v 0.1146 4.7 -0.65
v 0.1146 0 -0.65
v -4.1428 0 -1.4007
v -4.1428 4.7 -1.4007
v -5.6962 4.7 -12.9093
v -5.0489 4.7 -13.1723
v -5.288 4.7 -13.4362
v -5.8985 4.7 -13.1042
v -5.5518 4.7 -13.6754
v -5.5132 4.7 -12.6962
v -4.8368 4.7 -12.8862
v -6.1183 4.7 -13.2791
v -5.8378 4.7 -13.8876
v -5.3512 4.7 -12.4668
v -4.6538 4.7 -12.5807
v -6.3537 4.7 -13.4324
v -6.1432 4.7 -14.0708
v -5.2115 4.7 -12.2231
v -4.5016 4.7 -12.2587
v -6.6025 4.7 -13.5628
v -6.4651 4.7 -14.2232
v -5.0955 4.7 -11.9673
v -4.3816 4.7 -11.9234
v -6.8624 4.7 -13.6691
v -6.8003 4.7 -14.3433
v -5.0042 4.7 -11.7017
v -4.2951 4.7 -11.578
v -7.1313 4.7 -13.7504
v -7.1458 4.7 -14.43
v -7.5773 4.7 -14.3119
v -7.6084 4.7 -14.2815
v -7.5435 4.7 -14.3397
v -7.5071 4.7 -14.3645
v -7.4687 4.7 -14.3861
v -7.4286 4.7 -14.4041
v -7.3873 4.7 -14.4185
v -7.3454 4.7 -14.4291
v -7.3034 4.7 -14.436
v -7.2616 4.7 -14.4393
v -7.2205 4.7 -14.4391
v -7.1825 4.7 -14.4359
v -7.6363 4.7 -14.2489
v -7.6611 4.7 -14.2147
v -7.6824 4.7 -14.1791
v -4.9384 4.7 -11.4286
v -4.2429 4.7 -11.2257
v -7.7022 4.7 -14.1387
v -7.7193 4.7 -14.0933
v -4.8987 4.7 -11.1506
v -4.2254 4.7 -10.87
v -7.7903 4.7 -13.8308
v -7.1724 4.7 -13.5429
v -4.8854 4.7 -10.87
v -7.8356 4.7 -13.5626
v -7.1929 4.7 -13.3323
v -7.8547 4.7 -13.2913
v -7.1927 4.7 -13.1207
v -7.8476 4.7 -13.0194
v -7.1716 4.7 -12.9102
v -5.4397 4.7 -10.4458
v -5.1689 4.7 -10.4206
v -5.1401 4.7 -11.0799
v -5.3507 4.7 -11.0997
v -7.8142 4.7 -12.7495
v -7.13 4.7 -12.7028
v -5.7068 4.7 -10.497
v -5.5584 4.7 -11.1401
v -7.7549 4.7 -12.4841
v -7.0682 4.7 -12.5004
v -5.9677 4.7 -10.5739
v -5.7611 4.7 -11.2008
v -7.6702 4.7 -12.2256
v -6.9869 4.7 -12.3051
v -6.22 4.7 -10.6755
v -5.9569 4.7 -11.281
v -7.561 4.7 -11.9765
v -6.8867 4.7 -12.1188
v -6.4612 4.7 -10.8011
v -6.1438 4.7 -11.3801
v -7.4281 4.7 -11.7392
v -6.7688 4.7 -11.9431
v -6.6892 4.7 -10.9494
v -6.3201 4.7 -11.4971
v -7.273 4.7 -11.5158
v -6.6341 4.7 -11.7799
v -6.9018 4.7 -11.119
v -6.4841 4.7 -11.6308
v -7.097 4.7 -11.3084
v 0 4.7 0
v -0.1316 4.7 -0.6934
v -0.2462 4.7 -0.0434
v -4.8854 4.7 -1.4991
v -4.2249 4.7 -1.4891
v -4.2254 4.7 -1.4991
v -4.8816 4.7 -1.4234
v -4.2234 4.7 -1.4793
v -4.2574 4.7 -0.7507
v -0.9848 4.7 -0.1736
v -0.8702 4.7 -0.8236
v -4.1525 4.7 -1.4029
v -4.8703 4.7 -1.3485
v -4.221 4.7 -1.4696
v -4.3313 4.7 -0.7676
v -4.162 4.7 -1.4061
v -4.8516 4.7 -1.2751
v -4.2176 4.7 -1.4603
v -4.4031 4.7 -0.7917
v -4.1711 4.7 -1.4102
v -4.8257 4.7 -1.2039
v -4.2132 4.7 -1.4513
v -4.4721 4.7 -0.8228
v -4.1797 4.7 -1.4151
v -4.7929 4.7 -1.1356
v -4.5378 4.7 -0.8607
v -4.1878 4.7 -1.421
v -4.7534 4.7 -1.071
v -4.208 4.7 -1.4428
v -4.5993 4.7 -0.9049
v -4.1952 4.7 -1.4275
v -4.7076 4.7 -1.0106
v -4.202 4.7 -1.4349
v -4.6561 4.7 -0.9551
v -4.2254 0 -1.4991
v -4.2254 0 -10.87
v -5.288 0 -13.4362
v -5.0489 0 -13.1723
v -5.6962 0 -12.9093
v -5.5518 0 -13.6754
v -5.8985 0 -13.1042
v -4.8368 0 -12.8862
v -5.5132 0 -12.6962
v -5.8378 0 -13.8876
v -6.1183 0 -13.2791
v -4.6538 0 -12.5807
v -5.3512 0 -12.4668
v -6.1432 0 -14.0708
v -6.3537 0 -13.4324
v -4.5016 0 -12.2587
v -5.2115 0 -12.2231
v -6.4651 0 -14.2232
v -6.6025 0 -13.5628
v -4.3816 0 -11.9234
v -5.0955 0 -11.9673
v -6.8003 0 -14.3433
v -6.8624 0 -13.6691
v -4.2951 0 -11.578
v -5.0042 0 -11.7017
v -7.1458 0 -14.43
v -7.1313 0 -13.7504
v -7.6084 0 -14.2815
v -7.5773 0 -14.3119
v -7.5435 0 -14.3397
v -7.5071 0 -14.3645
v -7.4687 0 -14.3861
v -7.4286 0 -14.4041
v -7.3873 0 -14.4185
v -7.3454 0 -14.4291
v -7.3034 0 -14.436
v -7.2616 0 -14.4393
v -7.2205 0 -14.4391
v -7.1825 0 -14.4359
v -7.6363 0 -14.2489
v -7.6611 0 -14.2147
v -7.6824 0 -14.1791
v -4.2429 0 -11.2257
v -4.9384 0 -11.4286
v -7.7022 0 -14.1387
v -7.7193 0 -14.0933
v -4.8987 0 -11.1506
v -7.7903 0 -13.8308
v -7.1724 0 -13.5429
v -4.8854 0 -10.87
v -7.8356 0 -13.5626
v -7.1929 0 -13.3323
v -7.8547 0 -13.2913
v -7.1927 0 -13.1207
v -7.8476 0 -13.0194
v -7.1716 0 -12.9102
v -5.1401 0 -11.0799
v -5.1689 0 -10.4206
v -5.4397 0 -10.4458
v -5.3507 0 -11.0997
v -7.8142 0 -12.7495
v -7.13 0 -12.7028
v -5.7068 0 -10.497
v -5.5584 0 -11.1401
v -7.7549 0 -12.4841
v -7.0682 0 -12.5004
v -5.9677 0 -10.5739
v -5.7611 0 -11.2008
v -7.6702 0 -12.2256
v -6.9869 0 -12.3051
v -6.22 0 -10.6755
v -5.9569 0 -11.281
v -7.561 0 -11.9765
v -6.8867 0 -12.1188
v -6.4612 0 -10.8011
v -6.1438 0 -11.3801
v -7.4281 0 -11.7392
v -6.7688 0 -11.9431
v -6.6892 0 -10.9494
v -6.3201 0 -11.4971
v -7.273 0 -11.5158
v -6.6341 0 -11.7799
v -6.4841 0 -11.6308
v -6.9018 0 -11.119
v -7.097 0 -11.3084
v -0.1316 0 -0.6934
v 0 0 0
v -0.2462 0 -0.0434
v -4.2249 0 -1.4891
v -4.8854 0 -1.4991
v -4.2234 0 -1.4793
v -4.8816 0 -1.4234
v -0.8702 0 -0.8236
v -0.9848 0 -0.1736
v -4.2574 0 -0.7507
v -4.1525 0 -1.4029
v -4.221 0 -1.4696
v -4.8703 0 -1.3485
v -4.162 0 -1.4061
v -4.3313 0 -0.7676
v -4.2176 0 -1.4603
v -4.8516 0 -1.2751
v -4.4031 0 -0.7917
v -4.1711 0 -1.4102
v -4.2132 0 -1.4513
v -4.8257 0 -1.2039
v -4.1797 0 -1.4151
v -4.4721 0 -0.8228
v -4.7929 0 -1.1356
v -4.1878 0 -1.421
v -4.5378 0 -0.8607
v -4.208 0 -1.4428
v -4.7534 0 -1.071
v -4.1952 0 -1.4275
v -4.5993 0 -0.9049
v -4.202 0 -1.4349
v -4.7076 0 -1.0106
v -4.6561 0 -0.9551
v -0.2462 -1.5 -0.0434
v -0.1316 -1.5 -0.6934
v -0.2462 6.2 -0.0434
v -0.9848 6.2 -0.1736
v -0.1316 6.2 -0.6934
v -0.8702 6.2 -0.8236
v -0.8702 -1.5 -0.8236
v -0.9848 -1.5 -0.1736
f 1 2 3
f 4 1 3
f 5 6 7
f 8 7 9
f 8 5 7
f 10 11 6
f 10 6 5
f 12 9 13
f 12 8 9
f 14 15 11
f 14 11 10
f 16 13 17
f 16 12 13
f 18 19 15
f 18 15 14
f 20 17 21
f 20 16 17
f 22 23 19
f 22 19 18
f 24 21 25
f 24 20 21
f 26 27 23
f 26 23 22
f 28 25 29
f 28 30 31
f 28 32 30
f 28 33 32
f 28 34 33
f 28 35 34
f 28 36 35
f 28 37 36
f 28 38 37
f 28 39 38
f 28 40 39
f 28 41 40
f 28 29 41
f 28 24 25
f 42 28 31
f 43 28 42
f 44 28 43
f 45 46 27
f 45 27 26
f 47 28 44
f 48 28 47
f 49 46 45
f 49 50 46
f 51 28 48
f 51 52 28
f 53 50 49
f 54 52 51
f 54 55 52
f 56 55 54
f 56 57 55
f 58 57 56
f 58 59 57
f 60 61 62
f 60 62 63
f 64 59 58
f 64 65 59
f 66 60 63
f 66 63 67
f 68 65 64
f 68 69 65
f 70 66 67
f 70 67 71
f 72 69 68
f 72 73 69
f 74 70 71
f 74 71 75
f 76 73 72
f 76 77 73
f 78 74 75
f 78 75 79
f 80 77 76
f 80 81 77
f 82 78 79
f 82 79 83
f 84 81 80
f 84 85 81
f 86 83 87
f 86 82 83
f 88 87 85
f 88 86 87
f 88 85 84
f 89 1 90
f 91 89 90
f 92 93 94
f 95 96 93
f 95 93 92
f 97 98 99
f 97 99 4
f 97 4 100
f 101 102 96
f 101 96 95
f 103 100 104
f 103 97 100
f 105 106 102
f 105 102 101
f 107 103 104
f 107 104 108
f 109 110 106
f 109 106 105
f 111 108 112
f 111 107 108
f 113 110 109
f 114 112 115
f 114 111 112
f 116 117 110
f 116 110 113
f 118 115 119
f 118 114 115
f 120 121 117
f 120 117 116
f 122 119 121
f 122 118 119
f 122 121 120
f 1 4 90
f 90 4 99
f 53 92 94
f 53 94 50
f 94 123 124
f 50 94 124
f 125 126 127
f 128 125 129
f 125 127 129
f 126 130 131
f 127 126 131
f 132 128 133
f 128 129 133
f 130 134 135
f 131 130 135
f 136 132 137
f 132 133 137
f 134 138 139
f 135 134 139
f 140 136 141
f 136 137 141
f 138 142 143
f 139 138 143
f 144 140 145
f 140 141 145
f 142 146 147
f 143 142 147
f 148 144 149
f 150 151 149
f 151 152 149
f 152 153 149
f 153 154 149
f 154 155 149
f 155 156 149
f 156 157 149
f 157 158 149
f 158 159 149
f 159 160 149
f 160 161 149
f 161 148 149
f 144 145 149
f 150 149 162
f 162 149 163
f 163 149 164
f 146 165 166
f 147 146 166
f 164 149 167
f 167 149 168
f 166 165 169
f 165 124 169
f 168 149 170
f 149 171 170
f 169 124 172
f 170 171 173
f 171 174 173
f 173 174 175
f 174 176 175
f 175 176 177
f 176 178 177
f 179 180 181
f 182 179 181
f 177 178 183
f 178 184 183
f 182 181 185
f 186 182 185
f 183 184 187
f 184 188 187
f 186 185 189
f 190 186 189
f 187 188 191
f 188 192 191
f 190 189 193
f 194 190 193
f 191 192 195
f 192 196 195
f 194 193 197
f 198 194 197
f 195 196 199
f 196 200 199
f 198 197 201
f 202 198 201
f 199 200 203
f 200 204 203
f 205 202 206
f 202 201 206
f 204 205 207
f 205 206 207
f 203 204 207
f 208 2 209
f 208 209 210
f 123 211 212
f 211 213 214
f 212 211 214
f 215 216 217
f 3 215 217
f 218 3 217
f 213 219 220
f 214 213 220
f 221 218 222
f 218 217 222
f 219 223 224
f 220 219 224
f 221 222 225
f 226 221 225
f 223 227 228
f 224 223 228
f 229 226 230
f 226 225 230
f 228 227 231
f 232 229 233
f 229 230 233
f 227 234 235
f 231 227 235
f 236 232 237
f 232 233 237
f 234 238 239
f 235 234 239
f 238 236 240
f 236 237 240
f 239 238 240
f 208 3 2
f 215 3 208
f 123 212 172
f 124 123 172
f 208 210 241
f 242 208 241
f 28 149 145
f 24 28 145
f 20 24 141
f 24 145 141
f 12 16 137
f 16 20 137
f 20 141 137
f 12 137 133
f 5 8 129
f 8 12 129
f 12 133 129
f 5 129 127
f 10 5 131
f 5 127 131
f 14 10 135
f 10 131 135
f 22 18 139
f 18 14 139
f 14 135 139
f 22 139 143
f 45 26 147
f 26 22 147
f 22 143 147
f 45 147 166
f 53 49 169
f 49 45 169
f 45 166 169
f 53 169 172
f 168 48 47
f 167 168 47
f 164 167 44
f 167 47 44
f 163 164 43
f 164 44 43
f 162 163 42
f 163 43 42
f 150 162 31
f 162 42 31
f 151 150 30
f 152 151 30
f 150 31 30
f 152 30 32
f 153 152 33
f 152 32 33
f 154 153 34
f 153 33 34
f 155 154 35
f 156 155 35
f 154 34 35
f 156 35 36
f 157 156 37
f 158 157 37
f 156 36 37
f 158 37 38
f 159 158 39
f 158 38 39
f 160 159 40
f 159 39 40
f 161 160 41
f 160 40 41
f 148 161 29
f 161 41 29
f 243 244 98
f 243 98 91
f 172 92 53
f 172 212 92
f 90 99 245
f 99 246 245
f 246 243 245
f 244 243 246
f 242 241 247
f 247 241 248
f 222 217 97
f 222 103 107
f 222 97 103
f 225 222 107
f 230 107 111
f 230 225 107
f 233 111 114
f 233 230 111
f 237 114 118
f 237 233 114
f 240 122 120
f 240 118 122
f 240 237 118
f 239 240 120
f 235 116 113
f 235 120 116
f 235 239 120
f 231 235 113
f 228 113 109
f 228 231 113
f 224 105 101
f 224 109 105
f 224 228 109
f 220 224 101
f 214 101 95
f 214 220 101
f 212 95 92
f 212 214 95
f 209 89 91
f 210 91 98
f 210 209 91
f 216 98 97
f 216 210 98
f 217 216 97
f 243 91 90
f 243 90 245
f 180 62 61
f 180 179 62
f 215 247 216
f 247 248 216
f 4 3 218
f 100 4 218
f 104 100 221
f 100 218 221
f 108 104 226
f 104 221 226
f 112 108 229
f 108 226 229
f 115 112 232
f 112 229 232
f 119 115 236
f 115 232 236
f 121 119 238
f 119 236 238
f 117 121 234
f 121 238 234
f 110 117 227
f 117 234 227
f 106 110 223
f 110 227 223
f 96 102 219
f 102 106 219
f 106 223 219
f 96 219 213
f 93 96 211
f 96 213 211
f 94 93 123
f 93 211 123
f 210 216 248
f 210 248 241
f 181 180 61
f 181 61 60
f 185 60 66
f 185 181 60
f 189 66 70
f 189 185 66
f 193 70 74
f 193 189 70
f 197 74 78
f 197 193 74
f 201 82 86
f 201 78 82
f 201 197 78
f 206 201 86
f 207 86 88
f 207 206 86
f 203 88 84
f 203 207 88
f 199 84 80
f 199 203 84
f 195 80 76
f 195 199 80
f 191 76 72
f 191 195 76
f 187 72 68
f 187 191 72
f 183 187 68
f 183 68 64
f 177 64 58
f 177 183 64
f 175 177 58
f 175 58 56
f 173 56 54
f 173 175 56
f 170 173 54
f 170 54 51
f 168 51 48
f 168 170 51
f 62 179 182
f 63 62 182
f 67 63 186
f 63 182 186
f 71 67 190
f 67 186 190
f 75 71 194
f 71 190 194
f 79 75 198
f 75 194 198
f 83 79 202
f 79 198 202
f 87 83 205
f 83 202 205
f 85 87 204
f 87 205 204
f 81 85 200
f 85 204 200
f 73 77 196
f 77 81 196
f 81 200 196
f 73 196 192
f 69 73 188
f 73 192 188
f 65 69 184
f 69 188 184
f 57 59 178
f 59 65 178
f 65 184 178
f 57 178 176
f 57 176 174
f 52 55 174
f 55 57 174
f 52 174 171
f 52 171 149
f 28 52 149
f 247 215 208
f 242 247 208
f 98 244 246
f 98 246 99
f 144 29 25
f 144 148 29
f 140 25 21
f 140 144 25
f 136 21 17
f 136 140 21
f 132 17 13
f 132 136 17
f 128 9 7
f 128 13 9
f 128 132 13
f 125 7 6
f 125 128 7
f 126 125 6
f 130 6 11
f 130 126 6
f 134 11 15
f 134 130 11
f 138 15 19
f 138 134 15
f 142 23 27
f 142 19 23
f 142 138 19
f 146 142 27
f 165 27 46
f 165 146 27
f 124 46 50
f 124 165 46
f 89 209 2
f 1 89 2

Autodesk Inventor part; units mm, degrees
ref_plane "YZ Plane" through (0, 0, 0) normal (1, 0, 0) x (0, 1, 0)
ref_plane "XZ Plane" through (0, 0, 0) normal (0, 1, 0) x (-1, 0, 0)
ref_plane "XY Plane" through (0, 0, 0) normal (0, 0, 1) x (1, 0, 0)
sketch "Sketch1" plane through (0, 0, 0) normal (0, 1, 0) x (-1, 0, 0)
  line L0 (0, 0) -> (4.2574, -0.7507)
  line L1 (4.8854, -1.4991) -> (4.8854, -10.87)
  line L2 (0, 0) -> (-0.1146, -0.65)
  line L3 (-0.1146, -0.65) -> (4.1428, -1.4007)
  line L4 (4.2254, -1.4991) -> (4.2254, -10.87)
  line L5 (4.8854, -7.3684) -> (4.2254, -7.3684) construction
  arc A0 (4.8854, -1.4991) -> (4.2574, -0.7507) centre (4.1254, -1.4991) ccw
  arc A1 (4.2254, -1.4991) -> (4.1428, -1.4007) centre (4.1254, -1.4991) ccw
  line L6 (0, 0) -> (9.7928, 0) construction
  arc A2 (4.2254, -10.87) -> (7.5579, -14.4878) centre (7.8554, -10.87) ccw
  arc A3 (4.8854, -10.87) -> (7.1313, -13.7504) centre (7.8554, -10.87) ccw
  arc A4 (7.1313, -13.7504) -> (5.1401, -11.0799) centre (5.0441, -13.2291) ccw
  line L7 (7.1313, -13.7504) -> (6.9714, -14.3907) construction
  line L8 (7.1313, -13.7504) -> (7.7714, -13.9113) construction
  line L9 (5.1401, -11.0799) -> (5.1689, -10.4206)
  arc A5 (7.5579, -14.4878) -> (5.1689, -10.4206) centre (5.0441, -13.2291) ccw
  line L10 (7.8554, -14.5) -> (1.0376, -14.5) construction
  line L11 (7.8554, -14.5) -> (7.8554, -9.8671) construction
  dimension "d0" = 0.66
  dimension "d2" = 10
  dimension "d3" = 0.1
  dimension "d4" = 14.5
  dimension "d5" = 5
  dimension "d6" = 3.63
  dimension "d8" = 2.5
  dimension "d9" = 4.0794
extrude "Extrusion1" add sketch "Sketch1" along normal blind 4.7
fillet "Fillet1" radius 0.5 1 edges at (-7.5579, 2.35, -14.4878)
sketch "Sketch2" plane through (0, 0, 0) normal (-0.1736, 0, 0.9848) x (0.9848, 0, 0.1736)
  line L0 (-4.323, 4.7) -> (0, 4.7) projected
  line L1 (0, 0) -> (-4.323, 0) projected
  line L2 (-1, 4.7) -> (-0.25, 4.7)
  line L3 (-0.25, 4.7) -> (-0.25, 6.2)
  line L4 (-0.25, 6.2) -> (-1, 6.2)
  line L5 (-1, 6.2) -> (-1, 4.7)
  line L6 (-1, 0) -> (-0.25, 0)
  line L7 (-0.25, 0) -> (-0.25, -1.5)
  line L8 (-0.25, -1.5) -> (-1, -1.5)
  line L9 (-1, -1.5) -> (-1, 0)
  line L10 (0, 0) -> (0, 4.7) projected
  dimension "d13" = 1.5
  dimension "d14" = 0.75
  dimension "d15" = 0.25
extrude "Extrusion2" add sketch "Sketch2" against normal up to surface (0.66 mm away)
properties part number "Lever" material "Stainless Steel"
